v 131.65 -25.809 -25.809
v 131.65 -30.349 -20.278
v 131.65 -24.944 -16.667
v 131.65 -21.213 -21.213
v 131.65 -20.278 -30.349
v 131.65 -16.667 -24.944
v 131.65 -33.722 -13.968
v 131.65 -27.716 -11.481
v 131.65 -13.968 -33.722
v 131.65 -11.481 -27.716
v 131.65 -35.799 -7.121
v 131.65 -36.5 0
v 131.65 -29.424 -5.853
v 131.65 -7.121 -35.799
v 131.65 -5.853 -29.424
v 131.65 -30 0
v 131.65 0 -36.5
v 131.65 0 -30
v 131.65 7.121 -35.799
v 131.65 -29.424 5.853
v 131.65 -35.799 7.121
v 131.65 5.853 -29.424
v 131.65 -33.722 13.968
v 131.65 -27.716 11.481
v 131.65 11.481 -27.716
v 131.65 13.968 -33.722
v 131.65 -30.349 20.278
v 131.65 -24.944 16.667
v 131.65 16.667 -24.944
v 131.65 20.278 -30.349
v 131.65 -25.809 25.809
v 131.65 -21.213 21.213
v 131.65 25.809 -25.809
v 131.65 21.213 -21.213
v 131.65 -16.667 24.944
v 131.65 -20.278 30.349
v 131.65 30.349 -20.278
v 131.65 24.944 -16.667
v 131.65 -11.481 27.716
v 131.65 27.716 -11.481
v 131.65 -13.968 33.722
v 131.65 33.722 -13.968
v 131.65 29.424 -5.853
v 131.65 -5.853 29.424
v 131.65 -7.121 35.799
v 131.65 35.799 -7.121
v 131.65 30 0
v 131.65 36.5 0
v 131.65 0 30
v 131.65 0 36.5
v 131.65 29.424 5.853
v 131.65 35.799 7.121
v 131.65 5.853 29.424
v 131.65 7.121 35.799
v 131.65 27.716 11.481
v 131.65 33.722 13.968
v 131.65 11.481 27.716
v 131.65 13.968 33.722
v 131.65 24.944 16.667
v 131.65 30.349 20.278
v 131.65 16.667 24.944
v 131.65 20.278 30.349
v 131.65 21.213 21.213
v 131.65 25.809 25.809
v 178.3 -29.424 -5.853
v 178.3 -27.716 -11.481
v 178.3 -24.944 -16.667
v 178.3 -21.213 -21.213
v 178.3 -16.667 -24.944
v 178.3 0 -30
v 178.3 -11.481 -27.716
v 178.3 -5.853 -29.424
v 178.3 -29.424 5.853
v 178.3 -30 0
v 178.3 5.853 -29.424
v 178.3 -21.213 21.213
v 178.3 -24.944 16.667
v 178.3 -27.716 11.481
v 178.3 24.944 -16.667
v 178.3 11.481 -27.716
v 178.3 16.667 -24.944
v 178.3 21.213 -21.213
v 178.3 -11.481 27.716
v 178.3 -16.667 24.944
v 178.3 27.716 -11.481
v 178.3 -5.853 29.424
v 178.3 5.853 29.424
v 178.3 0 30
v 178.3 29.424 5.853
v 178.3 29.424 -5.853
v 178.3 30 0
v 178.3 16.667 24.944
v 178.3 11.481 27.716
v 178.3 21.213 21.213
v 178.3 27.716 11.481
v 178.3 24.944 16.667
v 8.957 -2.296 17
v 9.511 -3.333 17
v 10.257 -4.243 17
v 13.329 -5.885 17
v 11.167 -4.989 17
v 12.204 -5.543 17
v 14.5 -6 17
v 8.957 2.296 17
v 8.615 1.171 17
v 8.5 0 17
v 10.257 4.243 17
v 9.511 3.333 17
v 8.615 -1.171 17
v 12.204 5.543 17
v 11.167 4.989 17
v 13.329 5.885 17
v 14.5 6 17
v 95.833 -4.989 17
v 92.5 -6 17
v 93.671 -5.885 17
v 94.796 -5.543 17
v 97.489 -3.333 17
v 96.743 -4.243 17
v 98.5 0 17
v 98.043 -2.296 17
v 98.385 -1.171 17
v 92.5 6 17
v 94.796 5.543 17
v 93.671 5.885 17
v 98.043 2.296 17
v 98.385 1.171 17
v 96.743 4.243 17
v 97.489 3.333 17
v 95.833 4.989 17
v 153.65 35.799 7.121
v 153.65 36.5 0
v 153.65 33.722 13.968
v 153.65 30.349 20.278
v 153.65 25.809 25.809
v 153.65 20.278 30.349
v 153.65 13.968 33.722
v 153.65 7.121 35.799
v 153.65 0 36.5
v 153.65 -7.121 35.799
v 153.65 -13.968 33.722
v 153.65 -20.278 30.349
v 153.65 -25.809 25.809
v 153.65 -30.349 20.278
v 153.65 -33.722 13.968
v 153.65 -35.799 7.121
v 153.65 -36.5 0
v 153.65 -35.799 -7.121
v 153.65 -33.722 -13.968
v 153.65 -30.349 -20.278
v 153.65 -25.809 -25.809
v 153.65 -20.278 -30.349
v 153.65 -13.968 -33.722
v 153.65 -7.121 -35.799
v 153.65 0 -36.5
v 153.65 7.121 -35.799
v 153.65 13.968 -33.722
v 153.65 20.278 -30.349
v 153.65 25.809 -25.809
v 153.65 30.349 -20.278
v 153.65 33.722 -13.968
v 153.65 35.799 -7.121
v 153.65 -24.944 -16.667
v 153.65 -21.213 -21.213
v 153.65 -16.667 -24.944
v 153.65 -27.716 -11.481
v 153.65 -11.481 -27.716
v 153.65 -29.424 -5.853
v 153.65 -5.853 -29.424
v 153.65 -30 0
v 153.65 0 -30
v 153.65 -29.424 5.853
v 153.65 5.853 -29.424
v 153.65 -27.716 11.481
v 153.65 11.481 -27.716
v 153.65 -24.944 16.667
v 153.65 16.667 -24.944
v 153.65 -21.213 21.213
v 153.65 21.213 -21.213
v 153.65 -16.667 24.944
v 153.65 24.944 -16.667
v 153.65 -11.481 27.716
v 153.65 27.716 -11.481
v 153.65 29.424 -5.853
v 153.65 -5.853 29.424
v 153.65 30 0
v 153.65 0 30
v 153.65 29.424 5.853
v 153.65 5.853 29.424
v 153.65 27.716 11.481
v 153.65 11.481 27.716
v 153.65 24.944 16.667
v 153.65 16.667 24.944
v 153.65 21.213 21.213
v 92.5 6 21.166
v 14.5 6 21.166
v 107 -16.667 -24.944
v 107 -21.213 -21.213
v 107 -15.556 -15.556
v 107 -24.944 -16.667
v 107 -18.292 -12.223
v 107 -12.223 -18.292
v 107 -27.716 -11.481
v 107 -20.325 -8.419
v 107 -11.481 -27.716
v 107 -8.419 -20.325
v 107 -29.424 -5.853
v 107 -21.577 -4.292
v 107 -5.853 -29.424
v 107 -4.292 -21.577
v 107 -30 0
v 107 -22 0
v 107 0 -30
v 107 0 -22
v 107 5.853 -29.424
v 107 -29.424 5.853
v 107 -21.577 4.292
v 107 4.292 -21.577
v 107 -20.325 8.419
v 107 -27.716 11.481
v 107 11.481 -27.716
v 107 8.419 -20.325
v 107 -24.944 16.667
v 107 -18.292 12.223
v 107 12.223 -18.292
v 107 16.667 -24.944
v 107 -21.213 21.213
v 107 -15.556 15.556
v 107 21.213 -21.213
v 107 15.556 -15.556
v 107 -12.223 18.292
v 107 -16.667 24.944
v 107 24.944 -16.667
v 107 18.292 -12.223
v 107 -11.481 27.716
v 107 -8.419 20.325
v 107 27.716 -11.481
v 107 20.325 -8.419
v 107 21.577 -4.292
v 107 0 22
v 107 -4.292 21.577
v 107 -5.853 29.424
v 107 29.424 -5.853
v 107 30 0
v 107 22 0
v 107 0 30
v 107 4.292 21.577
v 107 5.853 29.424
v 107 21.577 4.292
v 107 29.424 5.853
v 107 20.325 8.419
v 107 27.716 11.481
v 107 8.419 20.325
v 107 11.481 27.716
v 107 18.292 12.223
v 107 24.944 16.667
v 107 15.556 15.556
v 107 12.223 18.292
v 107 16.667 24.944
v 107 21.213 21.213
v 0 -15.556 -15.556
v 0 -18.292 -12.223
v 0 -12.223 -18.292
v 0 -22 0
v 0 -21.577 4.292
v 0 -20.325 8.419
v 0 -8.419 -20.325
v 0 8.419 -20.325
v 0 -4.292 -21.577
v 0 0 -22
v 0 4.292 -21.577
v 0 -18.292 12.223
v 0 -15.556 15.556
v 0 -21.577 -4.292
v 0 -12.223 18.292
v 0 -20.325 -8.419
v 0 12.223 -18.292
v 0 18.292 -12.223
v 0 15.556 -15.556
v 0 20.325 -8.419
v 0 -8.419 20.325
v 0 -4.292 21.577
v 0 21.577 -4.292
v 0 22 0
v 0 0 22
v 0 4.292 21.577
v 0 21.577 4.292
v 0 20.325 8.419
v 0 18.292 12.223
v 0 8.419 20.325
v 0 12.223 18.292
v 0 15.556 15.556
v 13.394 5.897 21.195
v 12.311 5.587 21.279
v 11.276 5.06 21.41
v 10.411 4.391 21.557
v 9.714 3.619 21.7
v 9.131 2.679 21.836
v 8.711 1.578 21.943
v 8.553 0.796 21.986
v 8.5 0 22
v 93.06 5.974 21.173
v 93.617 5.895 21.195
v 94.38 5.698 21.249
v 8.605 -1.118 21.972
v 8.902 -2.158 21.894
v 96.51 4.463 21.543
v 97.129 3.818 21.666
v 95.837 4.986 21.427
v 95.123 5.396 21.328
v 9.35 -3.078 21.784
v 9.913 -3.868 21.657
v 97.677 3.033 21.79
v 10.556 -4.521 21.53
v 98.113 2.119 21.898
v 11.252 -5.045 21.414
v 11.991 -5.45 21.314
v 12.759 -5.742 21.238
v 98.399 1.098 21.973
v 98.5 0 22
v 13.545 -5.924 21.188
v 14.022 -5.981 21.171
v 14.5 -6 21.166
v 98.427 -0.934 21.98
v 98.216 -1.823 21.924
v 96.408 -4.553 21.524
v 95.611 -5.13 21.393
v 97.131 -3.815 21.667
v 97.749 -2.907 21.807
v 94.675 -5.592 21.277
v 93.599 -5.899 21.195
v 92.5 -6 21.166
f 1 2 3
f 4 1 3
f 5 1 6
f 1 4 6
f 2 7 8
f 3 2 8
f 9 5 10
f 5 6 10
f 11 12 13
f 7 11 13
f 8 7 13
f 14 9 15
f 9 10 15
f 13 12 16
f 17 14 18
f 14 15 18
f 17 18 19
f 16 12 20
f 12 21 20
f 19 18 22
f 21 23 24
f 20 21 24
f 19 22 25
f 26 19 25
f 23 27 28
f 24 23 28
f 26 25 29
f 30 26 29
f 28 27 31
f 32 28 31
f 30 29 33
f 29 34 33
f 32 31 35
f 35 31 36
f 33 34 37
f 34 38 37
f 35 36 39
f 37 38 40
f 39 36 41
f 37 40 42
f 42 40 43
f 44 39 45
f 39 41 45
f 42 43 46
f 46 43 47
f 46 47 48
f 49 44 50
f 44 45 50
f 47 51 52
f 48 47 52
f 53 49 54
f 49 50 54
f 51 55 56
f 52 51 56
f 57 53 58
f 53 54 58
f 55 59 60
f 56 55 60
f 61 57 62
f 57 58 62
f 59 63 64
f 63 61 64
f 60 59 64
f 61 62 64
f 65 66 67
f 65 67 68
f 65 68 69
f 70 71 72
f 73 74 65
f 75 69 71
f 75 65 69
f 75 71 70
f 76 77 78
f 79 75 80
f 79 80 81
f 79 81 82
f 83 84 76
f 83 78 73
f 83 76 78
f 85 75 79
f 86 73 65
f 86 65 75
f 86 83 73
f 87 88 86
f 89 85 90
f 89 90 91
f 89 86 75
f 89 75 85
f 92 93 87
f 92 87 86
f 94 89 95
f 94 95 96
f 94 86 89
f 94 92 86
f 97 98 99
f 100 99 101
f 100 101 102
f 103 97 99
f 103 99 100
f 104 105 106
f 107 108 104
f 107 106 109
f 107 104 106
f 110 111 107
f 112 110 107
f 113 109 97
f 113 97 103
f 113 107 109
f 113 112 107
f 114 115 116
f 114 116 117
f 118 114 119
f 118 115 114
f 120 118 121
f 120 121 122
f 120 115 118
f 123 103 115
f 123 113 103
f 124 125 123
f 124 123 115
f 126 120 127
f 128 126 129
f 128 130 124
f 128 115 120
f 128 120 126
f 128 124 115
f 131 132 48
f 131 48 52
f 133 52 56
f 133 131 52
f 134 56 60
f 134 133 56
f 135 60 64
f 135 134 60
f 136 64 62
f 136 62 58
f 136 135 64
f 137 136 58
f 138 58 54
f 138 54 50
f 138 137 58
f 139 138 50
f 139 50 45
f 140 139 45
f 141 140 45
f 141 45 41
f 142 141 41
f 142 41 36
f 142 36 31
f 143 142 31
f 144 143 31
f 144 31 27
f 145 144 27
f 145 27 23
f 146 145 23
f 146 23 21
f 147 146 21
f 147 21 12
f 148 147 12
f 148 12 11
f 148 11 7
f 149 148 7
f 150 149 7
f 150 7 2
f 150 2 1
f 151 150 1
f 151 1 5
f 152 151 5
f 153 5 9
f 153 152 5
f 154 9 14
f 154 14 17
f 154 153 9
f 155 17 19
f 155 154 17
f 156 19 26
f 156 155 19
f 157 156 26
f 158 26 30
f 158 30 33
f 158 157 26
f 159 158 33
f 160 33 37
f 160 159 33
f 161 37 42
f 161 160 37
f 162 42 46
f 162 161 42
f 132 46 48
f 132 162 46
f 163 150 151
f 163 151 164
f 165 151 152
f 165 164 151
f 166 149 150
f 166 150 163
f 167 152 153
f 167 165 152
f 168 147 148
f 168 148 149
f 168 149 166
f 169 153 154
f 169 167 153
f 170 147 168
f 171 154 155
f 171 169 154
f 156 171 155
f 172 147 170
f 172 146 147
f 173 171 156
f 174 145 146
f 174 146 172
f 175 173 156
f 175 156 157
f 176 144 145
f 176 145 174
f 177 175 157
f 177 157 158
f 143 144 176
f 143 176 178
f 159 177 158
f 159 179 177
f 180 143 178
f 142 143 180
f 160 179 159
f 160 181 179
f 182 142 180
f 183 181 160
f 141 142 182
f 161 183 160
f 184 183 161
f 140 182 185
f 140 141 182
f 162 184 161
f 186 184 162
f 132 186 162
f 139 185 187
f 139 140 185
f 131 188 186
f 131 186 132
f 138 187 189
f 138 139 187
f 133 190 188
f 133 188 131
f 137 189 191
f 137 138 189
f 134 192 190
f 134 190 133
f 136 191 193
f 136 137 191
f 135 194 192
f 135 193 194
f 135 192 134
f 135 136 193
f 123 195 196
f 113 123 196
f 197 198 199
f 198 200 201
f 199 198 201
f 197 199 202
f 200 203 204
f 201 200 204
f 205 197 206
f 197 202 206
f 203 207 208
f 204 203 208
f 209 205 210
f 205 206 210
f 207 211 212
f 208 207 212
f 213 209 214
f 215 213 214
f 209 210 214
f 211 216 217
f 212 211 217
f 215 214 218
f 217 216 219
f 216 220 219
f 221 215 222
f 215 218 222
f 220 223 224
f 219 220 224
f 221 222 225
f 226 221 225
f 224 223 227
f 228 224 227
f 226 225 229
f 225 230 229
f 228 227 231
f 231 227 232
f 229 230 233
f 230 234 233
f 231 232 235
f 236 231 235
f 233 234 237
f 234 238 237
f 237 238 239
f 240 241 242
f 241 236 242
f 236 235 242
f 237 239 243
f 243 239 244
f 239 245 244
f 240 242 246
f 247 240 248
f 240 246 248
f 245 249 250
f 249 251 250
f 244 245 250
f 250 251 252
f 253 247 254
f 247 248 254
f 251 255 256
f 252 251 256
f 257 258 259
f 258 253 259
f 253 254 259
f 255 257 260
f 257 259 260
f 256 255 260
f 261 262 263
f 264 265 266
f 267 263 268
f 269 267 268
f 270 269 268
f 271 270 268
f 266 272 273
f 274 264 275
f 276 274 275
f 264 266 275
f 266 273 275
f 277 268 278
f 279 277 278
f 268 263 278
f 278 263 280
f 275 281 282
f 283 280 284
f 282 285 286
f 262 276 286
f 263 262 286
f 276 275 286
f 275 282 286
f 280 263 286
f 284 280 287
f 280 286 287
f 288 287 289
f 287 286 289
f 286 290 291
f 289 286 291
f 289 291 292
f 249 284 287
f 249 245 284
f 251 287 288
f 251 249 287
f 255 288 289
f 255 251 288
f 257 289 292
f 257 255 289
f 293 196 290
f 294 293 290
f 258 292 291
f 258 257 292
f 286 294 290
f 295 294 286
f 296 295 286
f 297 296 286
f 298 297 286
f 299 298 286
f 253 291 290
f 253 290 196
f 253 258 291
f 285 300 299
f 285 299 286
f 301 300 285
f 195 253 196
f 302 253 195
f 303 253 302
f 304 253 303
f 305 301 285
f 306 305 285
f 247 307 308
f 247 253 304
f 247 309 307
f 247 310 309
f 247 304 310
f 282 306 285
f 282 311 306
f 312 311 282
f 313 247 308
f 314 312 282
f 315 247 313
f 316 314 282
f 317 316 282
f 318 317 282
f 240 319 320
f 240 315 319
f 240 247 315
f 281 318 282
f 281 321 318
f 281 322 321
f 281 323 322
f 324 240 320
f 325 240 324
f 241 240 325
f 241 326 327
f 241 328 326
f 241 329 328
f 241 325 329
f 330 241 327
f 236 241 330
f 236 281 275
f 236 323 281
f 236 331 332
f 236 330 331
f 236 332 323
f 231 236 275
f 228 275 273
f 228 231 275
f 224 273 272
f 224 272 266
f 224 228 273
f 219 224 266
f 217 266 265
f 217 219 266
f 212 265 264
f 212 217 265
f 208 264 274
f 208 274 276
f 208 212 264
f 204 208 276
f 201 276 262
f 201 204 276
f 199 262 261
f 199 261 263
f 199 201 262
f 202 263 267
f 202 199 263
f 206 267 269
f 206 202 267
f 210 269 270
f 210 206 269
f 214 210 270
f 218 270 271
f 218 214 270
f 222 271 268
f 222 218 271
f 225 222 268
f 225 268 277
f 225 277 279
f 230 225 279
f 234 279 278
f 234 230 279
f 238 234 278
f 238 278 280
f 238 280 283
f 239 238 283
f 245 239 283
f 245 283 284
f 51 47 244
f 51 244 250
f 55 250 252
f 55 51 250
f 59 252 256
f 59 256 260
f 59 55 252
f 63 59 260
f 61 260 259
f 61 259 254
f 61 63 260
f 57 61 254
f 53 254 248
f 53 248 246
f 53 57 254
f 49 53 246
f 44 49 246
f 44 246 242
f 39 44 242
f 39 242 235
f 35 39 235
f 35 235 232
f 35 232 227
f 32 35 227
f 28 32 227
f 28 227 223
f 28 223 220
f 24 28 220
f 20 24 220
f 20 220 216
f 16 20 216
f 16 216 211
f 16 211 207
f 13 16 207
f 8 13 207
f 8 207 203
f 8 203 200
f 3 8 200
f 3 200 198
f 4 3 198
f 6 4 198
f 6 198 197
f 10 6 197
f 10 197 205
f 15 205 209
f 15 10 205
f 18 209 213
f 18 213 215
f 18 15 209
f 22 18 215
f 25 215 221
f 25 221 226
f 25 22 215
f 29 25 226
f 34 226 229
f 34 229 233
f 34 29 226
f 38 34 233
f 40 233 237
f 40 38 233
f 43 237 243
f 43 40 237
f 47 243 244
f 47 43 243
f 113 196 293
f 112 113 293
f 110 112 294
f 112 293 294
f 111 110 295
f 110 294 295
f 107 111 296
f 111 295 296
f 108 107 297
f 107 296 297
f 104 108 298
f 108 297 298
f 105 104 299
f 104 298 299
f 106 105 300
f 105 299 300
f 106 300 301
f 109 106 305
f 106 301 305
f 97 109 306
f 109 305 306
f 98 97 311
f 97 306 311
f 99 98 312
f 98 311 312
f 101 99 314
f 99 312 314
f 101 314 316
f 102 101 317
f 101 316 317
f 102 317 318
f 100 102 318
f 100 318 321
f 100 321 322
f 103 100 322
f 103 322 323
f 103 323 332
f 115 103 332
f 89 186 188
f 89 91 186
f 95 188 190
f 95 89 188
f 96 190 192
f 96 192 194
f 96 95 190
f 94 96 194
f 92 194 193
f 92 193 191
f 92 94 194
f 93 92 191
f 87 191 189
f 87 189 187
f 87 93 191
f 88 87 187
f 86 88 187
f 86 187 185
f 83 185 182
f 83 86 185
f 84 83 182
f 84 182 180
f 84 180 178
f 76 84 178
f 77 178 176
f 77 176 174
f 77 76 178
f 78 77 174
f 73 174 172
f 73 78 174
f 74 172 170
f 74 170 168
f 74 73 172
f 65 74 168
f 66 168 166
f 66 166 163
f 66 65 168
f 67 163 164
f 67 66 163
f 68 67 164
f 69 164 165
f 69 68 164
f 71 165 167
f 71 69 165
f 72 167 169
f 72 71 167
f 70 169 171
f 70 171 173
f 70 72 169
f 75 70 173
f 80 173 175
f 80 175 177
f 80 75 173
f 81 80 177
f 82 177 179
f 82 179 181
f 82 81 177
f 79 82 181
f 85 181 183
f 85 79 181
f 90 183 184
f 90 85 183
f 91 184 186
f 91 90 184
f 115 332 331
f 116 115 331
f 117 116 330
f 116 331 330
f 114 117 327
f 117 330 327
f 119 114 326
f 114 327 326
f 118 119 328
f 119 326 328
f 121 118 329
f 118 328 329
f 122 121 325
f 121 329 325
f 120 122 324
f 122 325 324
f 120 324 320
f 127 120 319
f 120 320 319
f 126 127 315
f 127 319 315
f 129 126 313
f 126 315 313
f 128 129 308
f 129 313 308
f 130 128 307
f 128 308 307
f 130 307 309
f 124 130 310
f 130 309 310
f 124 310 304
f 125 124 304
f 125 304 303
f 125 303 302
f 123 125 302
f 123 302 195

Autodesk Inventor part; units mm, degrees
ref_plane "YZ Plane" through (0, 0, 0) normal (1, 0, 0) x (0, 1, 0)
ref_plane "XZ Plane" through (0, 0, 0) normal (0, 1, 0) x (-1, 0, 0)
sketch "Skizze1" plane through (0, 0, 0) normal (0, 0, 1) x (1, 0, 0)
  line L0 (0, 0) -> (0, 22)
  line L1 (0, 22) -> (107, 22)
  line L2 (107, 22) -> (107, 30)
  line L3 (107, 30) -> (131.65, 30)
  line L4 (131.65, 30) -> (131.65, 36.5)
  line L5 (131.65, 36.5) -> (153.65, 36.5)
  line L6 (153.65, 36.5) -> (153.65, 30)
  line L7 (153.65, 30) -> (178.3, 30)
  line L8 (178.3, 30) -> (178.3, 0)
  line L9 (178.3, 0) -> (0, 0)
  line L10 (-35.66, 0) -> (213.96, 0) projected
revolve "Umdrehung1" add sketch "Skizze1" angle 360 about axis through (-10, 0, 0) along (1, 0, 0)
ref_plane "Arbeitsebene1" through (0, 0, 22) normal (0, 0, 1) x (1, 0, 0)
sketch "Skizze2" plane through (0, 0, 22) normal (0, 0, 1) x (1, 0, 0)
  line L0 (8.5, 0) -> (98.5, 0) construction
  line L1 (14.5, -6) -> (92.5, -6)
  line L2 (92.5, 6) -> (14.5, 6)
  arc A0 (14.5, 6) -> (14.5, -6) centre (14.5, 0) ccw
  arc A1 (92.5, -6) -> (92.5, 6) centre (92.5, 0) ccw
  point P0 (53.5, 0)
extrude "Extrusion1" cut sketch "Skizze2" against normal blind 5
properties part number "shaft_6"
